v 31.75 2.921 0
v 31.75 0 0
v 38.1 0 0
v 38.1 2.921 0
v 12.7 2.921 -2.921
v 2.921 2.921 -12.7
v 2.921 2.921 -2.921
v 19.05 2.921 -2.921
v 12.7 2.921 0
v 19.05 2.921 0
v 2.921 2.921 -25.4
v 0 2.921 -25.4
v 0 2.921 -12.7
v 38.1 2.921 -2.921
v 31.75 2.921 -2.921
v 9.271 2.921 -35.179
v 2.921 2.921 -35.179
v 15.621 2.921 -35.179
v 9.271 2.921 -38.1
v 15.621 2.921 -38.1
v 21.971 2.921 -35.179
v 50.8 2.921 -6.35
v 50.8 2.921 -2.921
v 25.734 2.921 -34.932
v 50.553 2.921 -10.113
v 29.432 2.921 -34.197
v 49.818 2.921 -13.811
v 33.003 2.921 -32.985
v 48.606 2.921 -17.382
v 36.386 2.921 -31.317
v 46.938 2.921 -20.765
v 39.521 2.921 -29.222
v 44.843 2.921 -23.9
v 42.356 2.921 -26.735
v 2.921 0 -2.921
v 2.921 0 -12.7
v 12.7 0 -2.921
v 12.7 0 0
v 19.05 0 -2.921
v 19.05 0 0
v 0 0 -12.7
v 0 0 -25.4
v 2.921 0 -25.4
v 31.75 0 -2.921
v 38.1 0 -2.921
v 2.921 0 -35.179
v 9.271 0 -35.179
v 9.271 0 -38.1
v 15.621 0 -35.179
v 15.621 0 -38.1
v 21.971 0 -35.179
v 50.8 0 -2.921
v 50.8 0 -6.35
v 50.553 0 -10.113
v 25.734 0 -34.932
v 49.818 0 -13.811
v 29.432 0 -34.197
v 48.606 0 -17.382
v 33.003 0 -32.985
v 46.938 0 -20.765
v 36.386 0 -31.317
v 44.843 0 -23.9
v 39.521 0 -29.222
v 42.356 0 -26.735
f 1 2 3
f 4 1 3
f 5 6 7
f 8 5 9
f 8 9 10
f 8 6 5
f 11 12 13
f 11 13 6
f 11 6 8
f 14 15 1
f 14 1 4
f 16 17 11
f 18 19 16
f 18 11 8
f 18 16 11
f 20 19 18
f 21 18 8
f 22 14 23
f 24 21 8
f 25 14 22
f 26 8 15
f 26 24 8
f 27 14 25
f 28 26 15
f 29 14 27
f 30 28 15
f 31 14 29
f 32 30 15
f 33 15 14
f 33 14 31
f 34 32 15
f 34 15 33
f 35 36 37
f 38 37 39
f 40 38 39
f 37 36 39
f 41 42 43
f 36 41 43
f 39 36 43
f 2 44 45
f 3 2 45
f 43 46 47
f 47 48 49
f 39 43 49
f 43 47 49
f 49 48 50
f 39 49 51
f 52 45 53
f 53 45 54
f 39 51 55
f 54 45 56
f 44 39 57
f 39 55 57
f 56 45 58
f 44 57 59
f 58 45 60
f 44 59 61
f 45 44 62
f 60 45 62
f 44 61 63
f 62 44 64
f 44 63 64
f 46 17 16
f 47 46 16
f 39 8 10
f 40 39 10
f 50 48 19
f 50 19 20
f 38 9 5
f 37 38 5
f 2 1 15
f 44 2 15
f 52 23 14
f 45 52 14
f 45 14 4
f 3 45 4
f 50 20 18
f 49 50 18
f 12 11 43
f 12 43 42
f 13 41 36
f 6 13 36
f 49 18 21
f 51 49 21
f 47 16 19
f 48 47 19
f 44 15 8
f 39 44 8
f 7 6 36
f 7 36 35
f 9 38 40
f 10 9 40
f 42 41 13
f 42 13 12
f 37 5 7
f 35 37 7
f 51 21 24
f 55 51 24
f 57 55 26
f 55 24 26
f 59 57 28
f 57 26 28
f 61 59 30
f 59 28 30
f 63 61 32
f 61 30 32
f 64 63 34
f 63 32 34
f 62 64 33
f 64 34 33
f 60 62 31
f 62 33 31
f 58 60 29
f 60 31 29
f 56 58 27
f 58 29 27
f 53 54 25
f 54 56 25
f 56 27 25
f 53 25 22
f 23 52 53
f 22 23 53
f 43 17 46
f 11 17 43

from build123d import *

# Parameters (mm, degrees)
SKETCH1_W          = 50.8
SKETCH1_H          = 38.1
EXTRUDE_2_DEPTH    = 2.921
FRONT_TABS_DEPTH   = 64.567147498
SIDE_TAB_DEPTH     = 64.567147498
CUT_EXTRUDE2_DEPTH = 64.567147498


with BuildPart() as part:
    # Sketch1 → extrude 2 (new body)
    with BuildSketch(Plane(origin=(0, 0, 0), x_dir=(1, 0, 0), z_dir=(0, 1, 0))):
        with Locations((25.4, 19.05)):
            Rectangle(SKETCH1_W, SKETCH1_H)
    extrude(amount=EXTRUDE_2_DEPTH)

    # Sketch2 → front tabs (cut, through all)
    with BuildSketch(Plane(origin=(0, 2.921, 0), x_dir=(1, 0, 0), z_dir=(0, 1, 0))):
        Polygon((0, -13.073373741), (50.8, -13.073373741), (50.8, 2.921), (38.1, 2.921), (38.1, -7.014658109), (31.75, -7.014658109), (31.75, 2.921), (19.05, 2.921), (19.05, -5.986156243), (12.7, -5.986156243), (12.7, 2.921), (0, 2.921), align=None)
    extrude(amount=-FRONT_TABS_DEPTH, mode=Mode.SUBTRACT)

    # Sketch3 → side tab (cut, through all)
    with BuildSketch(Plane(origin=(0, 2.921, 0), x_dir=(1, 0, 0), z_dir=(0, 1, 0))):
        Polygon((2.921, 25.4), (-4.31094219, 25.4), (-4.31094219, 12.7), (2.921, 12.7), (2.921, 0), (-6.847135587, 0), (-6.847135587, 38.1), (2.921, 38.1), align=None)
    extrude(amount=-SIDE_TAB_DEPTH, mode=Mode.SUBTRACT)

    # Sketch5 → Cut-Extrude2 (cut, through all)
    with BuildSketch(Plane(origin=(0, 2.921, 0), x_dir=(1, 0, 0), z_dir=(0, 1, 0))):
        with BuildLine():
            Line((-6.071846443, 35.179), (9.271, 35.179))
            Line((9.271, 35.179), (9.271, 42.517295463))
            Line((9.271, 42.517295463), (15.621, 42.517295463))
            Line((15.621, 42.517295463), (15.621, 35.179))
            Line((15.621, 35.179), (21.971, 35.179))
            ThreePointArc((21.971, 35.179), (42.356181395, 26.735181395), (50.8, 6.35))
            Line((50.8, 6.35), (50.8, 2.921))
            Line((50.8, 2.921), (62.623975616, 47.008361676))
            Line((62.623975616, 47.008361676), (-4.438145021, 50.333756088))
            Line((-4.438145021, 50.333756088), (-6.071846443, 35.179))
        make_face()
    extrude(amount=-CUT_EXTRUDE2_DEPTH, mode=Mode.SUBTRACT)


solid = part.part
